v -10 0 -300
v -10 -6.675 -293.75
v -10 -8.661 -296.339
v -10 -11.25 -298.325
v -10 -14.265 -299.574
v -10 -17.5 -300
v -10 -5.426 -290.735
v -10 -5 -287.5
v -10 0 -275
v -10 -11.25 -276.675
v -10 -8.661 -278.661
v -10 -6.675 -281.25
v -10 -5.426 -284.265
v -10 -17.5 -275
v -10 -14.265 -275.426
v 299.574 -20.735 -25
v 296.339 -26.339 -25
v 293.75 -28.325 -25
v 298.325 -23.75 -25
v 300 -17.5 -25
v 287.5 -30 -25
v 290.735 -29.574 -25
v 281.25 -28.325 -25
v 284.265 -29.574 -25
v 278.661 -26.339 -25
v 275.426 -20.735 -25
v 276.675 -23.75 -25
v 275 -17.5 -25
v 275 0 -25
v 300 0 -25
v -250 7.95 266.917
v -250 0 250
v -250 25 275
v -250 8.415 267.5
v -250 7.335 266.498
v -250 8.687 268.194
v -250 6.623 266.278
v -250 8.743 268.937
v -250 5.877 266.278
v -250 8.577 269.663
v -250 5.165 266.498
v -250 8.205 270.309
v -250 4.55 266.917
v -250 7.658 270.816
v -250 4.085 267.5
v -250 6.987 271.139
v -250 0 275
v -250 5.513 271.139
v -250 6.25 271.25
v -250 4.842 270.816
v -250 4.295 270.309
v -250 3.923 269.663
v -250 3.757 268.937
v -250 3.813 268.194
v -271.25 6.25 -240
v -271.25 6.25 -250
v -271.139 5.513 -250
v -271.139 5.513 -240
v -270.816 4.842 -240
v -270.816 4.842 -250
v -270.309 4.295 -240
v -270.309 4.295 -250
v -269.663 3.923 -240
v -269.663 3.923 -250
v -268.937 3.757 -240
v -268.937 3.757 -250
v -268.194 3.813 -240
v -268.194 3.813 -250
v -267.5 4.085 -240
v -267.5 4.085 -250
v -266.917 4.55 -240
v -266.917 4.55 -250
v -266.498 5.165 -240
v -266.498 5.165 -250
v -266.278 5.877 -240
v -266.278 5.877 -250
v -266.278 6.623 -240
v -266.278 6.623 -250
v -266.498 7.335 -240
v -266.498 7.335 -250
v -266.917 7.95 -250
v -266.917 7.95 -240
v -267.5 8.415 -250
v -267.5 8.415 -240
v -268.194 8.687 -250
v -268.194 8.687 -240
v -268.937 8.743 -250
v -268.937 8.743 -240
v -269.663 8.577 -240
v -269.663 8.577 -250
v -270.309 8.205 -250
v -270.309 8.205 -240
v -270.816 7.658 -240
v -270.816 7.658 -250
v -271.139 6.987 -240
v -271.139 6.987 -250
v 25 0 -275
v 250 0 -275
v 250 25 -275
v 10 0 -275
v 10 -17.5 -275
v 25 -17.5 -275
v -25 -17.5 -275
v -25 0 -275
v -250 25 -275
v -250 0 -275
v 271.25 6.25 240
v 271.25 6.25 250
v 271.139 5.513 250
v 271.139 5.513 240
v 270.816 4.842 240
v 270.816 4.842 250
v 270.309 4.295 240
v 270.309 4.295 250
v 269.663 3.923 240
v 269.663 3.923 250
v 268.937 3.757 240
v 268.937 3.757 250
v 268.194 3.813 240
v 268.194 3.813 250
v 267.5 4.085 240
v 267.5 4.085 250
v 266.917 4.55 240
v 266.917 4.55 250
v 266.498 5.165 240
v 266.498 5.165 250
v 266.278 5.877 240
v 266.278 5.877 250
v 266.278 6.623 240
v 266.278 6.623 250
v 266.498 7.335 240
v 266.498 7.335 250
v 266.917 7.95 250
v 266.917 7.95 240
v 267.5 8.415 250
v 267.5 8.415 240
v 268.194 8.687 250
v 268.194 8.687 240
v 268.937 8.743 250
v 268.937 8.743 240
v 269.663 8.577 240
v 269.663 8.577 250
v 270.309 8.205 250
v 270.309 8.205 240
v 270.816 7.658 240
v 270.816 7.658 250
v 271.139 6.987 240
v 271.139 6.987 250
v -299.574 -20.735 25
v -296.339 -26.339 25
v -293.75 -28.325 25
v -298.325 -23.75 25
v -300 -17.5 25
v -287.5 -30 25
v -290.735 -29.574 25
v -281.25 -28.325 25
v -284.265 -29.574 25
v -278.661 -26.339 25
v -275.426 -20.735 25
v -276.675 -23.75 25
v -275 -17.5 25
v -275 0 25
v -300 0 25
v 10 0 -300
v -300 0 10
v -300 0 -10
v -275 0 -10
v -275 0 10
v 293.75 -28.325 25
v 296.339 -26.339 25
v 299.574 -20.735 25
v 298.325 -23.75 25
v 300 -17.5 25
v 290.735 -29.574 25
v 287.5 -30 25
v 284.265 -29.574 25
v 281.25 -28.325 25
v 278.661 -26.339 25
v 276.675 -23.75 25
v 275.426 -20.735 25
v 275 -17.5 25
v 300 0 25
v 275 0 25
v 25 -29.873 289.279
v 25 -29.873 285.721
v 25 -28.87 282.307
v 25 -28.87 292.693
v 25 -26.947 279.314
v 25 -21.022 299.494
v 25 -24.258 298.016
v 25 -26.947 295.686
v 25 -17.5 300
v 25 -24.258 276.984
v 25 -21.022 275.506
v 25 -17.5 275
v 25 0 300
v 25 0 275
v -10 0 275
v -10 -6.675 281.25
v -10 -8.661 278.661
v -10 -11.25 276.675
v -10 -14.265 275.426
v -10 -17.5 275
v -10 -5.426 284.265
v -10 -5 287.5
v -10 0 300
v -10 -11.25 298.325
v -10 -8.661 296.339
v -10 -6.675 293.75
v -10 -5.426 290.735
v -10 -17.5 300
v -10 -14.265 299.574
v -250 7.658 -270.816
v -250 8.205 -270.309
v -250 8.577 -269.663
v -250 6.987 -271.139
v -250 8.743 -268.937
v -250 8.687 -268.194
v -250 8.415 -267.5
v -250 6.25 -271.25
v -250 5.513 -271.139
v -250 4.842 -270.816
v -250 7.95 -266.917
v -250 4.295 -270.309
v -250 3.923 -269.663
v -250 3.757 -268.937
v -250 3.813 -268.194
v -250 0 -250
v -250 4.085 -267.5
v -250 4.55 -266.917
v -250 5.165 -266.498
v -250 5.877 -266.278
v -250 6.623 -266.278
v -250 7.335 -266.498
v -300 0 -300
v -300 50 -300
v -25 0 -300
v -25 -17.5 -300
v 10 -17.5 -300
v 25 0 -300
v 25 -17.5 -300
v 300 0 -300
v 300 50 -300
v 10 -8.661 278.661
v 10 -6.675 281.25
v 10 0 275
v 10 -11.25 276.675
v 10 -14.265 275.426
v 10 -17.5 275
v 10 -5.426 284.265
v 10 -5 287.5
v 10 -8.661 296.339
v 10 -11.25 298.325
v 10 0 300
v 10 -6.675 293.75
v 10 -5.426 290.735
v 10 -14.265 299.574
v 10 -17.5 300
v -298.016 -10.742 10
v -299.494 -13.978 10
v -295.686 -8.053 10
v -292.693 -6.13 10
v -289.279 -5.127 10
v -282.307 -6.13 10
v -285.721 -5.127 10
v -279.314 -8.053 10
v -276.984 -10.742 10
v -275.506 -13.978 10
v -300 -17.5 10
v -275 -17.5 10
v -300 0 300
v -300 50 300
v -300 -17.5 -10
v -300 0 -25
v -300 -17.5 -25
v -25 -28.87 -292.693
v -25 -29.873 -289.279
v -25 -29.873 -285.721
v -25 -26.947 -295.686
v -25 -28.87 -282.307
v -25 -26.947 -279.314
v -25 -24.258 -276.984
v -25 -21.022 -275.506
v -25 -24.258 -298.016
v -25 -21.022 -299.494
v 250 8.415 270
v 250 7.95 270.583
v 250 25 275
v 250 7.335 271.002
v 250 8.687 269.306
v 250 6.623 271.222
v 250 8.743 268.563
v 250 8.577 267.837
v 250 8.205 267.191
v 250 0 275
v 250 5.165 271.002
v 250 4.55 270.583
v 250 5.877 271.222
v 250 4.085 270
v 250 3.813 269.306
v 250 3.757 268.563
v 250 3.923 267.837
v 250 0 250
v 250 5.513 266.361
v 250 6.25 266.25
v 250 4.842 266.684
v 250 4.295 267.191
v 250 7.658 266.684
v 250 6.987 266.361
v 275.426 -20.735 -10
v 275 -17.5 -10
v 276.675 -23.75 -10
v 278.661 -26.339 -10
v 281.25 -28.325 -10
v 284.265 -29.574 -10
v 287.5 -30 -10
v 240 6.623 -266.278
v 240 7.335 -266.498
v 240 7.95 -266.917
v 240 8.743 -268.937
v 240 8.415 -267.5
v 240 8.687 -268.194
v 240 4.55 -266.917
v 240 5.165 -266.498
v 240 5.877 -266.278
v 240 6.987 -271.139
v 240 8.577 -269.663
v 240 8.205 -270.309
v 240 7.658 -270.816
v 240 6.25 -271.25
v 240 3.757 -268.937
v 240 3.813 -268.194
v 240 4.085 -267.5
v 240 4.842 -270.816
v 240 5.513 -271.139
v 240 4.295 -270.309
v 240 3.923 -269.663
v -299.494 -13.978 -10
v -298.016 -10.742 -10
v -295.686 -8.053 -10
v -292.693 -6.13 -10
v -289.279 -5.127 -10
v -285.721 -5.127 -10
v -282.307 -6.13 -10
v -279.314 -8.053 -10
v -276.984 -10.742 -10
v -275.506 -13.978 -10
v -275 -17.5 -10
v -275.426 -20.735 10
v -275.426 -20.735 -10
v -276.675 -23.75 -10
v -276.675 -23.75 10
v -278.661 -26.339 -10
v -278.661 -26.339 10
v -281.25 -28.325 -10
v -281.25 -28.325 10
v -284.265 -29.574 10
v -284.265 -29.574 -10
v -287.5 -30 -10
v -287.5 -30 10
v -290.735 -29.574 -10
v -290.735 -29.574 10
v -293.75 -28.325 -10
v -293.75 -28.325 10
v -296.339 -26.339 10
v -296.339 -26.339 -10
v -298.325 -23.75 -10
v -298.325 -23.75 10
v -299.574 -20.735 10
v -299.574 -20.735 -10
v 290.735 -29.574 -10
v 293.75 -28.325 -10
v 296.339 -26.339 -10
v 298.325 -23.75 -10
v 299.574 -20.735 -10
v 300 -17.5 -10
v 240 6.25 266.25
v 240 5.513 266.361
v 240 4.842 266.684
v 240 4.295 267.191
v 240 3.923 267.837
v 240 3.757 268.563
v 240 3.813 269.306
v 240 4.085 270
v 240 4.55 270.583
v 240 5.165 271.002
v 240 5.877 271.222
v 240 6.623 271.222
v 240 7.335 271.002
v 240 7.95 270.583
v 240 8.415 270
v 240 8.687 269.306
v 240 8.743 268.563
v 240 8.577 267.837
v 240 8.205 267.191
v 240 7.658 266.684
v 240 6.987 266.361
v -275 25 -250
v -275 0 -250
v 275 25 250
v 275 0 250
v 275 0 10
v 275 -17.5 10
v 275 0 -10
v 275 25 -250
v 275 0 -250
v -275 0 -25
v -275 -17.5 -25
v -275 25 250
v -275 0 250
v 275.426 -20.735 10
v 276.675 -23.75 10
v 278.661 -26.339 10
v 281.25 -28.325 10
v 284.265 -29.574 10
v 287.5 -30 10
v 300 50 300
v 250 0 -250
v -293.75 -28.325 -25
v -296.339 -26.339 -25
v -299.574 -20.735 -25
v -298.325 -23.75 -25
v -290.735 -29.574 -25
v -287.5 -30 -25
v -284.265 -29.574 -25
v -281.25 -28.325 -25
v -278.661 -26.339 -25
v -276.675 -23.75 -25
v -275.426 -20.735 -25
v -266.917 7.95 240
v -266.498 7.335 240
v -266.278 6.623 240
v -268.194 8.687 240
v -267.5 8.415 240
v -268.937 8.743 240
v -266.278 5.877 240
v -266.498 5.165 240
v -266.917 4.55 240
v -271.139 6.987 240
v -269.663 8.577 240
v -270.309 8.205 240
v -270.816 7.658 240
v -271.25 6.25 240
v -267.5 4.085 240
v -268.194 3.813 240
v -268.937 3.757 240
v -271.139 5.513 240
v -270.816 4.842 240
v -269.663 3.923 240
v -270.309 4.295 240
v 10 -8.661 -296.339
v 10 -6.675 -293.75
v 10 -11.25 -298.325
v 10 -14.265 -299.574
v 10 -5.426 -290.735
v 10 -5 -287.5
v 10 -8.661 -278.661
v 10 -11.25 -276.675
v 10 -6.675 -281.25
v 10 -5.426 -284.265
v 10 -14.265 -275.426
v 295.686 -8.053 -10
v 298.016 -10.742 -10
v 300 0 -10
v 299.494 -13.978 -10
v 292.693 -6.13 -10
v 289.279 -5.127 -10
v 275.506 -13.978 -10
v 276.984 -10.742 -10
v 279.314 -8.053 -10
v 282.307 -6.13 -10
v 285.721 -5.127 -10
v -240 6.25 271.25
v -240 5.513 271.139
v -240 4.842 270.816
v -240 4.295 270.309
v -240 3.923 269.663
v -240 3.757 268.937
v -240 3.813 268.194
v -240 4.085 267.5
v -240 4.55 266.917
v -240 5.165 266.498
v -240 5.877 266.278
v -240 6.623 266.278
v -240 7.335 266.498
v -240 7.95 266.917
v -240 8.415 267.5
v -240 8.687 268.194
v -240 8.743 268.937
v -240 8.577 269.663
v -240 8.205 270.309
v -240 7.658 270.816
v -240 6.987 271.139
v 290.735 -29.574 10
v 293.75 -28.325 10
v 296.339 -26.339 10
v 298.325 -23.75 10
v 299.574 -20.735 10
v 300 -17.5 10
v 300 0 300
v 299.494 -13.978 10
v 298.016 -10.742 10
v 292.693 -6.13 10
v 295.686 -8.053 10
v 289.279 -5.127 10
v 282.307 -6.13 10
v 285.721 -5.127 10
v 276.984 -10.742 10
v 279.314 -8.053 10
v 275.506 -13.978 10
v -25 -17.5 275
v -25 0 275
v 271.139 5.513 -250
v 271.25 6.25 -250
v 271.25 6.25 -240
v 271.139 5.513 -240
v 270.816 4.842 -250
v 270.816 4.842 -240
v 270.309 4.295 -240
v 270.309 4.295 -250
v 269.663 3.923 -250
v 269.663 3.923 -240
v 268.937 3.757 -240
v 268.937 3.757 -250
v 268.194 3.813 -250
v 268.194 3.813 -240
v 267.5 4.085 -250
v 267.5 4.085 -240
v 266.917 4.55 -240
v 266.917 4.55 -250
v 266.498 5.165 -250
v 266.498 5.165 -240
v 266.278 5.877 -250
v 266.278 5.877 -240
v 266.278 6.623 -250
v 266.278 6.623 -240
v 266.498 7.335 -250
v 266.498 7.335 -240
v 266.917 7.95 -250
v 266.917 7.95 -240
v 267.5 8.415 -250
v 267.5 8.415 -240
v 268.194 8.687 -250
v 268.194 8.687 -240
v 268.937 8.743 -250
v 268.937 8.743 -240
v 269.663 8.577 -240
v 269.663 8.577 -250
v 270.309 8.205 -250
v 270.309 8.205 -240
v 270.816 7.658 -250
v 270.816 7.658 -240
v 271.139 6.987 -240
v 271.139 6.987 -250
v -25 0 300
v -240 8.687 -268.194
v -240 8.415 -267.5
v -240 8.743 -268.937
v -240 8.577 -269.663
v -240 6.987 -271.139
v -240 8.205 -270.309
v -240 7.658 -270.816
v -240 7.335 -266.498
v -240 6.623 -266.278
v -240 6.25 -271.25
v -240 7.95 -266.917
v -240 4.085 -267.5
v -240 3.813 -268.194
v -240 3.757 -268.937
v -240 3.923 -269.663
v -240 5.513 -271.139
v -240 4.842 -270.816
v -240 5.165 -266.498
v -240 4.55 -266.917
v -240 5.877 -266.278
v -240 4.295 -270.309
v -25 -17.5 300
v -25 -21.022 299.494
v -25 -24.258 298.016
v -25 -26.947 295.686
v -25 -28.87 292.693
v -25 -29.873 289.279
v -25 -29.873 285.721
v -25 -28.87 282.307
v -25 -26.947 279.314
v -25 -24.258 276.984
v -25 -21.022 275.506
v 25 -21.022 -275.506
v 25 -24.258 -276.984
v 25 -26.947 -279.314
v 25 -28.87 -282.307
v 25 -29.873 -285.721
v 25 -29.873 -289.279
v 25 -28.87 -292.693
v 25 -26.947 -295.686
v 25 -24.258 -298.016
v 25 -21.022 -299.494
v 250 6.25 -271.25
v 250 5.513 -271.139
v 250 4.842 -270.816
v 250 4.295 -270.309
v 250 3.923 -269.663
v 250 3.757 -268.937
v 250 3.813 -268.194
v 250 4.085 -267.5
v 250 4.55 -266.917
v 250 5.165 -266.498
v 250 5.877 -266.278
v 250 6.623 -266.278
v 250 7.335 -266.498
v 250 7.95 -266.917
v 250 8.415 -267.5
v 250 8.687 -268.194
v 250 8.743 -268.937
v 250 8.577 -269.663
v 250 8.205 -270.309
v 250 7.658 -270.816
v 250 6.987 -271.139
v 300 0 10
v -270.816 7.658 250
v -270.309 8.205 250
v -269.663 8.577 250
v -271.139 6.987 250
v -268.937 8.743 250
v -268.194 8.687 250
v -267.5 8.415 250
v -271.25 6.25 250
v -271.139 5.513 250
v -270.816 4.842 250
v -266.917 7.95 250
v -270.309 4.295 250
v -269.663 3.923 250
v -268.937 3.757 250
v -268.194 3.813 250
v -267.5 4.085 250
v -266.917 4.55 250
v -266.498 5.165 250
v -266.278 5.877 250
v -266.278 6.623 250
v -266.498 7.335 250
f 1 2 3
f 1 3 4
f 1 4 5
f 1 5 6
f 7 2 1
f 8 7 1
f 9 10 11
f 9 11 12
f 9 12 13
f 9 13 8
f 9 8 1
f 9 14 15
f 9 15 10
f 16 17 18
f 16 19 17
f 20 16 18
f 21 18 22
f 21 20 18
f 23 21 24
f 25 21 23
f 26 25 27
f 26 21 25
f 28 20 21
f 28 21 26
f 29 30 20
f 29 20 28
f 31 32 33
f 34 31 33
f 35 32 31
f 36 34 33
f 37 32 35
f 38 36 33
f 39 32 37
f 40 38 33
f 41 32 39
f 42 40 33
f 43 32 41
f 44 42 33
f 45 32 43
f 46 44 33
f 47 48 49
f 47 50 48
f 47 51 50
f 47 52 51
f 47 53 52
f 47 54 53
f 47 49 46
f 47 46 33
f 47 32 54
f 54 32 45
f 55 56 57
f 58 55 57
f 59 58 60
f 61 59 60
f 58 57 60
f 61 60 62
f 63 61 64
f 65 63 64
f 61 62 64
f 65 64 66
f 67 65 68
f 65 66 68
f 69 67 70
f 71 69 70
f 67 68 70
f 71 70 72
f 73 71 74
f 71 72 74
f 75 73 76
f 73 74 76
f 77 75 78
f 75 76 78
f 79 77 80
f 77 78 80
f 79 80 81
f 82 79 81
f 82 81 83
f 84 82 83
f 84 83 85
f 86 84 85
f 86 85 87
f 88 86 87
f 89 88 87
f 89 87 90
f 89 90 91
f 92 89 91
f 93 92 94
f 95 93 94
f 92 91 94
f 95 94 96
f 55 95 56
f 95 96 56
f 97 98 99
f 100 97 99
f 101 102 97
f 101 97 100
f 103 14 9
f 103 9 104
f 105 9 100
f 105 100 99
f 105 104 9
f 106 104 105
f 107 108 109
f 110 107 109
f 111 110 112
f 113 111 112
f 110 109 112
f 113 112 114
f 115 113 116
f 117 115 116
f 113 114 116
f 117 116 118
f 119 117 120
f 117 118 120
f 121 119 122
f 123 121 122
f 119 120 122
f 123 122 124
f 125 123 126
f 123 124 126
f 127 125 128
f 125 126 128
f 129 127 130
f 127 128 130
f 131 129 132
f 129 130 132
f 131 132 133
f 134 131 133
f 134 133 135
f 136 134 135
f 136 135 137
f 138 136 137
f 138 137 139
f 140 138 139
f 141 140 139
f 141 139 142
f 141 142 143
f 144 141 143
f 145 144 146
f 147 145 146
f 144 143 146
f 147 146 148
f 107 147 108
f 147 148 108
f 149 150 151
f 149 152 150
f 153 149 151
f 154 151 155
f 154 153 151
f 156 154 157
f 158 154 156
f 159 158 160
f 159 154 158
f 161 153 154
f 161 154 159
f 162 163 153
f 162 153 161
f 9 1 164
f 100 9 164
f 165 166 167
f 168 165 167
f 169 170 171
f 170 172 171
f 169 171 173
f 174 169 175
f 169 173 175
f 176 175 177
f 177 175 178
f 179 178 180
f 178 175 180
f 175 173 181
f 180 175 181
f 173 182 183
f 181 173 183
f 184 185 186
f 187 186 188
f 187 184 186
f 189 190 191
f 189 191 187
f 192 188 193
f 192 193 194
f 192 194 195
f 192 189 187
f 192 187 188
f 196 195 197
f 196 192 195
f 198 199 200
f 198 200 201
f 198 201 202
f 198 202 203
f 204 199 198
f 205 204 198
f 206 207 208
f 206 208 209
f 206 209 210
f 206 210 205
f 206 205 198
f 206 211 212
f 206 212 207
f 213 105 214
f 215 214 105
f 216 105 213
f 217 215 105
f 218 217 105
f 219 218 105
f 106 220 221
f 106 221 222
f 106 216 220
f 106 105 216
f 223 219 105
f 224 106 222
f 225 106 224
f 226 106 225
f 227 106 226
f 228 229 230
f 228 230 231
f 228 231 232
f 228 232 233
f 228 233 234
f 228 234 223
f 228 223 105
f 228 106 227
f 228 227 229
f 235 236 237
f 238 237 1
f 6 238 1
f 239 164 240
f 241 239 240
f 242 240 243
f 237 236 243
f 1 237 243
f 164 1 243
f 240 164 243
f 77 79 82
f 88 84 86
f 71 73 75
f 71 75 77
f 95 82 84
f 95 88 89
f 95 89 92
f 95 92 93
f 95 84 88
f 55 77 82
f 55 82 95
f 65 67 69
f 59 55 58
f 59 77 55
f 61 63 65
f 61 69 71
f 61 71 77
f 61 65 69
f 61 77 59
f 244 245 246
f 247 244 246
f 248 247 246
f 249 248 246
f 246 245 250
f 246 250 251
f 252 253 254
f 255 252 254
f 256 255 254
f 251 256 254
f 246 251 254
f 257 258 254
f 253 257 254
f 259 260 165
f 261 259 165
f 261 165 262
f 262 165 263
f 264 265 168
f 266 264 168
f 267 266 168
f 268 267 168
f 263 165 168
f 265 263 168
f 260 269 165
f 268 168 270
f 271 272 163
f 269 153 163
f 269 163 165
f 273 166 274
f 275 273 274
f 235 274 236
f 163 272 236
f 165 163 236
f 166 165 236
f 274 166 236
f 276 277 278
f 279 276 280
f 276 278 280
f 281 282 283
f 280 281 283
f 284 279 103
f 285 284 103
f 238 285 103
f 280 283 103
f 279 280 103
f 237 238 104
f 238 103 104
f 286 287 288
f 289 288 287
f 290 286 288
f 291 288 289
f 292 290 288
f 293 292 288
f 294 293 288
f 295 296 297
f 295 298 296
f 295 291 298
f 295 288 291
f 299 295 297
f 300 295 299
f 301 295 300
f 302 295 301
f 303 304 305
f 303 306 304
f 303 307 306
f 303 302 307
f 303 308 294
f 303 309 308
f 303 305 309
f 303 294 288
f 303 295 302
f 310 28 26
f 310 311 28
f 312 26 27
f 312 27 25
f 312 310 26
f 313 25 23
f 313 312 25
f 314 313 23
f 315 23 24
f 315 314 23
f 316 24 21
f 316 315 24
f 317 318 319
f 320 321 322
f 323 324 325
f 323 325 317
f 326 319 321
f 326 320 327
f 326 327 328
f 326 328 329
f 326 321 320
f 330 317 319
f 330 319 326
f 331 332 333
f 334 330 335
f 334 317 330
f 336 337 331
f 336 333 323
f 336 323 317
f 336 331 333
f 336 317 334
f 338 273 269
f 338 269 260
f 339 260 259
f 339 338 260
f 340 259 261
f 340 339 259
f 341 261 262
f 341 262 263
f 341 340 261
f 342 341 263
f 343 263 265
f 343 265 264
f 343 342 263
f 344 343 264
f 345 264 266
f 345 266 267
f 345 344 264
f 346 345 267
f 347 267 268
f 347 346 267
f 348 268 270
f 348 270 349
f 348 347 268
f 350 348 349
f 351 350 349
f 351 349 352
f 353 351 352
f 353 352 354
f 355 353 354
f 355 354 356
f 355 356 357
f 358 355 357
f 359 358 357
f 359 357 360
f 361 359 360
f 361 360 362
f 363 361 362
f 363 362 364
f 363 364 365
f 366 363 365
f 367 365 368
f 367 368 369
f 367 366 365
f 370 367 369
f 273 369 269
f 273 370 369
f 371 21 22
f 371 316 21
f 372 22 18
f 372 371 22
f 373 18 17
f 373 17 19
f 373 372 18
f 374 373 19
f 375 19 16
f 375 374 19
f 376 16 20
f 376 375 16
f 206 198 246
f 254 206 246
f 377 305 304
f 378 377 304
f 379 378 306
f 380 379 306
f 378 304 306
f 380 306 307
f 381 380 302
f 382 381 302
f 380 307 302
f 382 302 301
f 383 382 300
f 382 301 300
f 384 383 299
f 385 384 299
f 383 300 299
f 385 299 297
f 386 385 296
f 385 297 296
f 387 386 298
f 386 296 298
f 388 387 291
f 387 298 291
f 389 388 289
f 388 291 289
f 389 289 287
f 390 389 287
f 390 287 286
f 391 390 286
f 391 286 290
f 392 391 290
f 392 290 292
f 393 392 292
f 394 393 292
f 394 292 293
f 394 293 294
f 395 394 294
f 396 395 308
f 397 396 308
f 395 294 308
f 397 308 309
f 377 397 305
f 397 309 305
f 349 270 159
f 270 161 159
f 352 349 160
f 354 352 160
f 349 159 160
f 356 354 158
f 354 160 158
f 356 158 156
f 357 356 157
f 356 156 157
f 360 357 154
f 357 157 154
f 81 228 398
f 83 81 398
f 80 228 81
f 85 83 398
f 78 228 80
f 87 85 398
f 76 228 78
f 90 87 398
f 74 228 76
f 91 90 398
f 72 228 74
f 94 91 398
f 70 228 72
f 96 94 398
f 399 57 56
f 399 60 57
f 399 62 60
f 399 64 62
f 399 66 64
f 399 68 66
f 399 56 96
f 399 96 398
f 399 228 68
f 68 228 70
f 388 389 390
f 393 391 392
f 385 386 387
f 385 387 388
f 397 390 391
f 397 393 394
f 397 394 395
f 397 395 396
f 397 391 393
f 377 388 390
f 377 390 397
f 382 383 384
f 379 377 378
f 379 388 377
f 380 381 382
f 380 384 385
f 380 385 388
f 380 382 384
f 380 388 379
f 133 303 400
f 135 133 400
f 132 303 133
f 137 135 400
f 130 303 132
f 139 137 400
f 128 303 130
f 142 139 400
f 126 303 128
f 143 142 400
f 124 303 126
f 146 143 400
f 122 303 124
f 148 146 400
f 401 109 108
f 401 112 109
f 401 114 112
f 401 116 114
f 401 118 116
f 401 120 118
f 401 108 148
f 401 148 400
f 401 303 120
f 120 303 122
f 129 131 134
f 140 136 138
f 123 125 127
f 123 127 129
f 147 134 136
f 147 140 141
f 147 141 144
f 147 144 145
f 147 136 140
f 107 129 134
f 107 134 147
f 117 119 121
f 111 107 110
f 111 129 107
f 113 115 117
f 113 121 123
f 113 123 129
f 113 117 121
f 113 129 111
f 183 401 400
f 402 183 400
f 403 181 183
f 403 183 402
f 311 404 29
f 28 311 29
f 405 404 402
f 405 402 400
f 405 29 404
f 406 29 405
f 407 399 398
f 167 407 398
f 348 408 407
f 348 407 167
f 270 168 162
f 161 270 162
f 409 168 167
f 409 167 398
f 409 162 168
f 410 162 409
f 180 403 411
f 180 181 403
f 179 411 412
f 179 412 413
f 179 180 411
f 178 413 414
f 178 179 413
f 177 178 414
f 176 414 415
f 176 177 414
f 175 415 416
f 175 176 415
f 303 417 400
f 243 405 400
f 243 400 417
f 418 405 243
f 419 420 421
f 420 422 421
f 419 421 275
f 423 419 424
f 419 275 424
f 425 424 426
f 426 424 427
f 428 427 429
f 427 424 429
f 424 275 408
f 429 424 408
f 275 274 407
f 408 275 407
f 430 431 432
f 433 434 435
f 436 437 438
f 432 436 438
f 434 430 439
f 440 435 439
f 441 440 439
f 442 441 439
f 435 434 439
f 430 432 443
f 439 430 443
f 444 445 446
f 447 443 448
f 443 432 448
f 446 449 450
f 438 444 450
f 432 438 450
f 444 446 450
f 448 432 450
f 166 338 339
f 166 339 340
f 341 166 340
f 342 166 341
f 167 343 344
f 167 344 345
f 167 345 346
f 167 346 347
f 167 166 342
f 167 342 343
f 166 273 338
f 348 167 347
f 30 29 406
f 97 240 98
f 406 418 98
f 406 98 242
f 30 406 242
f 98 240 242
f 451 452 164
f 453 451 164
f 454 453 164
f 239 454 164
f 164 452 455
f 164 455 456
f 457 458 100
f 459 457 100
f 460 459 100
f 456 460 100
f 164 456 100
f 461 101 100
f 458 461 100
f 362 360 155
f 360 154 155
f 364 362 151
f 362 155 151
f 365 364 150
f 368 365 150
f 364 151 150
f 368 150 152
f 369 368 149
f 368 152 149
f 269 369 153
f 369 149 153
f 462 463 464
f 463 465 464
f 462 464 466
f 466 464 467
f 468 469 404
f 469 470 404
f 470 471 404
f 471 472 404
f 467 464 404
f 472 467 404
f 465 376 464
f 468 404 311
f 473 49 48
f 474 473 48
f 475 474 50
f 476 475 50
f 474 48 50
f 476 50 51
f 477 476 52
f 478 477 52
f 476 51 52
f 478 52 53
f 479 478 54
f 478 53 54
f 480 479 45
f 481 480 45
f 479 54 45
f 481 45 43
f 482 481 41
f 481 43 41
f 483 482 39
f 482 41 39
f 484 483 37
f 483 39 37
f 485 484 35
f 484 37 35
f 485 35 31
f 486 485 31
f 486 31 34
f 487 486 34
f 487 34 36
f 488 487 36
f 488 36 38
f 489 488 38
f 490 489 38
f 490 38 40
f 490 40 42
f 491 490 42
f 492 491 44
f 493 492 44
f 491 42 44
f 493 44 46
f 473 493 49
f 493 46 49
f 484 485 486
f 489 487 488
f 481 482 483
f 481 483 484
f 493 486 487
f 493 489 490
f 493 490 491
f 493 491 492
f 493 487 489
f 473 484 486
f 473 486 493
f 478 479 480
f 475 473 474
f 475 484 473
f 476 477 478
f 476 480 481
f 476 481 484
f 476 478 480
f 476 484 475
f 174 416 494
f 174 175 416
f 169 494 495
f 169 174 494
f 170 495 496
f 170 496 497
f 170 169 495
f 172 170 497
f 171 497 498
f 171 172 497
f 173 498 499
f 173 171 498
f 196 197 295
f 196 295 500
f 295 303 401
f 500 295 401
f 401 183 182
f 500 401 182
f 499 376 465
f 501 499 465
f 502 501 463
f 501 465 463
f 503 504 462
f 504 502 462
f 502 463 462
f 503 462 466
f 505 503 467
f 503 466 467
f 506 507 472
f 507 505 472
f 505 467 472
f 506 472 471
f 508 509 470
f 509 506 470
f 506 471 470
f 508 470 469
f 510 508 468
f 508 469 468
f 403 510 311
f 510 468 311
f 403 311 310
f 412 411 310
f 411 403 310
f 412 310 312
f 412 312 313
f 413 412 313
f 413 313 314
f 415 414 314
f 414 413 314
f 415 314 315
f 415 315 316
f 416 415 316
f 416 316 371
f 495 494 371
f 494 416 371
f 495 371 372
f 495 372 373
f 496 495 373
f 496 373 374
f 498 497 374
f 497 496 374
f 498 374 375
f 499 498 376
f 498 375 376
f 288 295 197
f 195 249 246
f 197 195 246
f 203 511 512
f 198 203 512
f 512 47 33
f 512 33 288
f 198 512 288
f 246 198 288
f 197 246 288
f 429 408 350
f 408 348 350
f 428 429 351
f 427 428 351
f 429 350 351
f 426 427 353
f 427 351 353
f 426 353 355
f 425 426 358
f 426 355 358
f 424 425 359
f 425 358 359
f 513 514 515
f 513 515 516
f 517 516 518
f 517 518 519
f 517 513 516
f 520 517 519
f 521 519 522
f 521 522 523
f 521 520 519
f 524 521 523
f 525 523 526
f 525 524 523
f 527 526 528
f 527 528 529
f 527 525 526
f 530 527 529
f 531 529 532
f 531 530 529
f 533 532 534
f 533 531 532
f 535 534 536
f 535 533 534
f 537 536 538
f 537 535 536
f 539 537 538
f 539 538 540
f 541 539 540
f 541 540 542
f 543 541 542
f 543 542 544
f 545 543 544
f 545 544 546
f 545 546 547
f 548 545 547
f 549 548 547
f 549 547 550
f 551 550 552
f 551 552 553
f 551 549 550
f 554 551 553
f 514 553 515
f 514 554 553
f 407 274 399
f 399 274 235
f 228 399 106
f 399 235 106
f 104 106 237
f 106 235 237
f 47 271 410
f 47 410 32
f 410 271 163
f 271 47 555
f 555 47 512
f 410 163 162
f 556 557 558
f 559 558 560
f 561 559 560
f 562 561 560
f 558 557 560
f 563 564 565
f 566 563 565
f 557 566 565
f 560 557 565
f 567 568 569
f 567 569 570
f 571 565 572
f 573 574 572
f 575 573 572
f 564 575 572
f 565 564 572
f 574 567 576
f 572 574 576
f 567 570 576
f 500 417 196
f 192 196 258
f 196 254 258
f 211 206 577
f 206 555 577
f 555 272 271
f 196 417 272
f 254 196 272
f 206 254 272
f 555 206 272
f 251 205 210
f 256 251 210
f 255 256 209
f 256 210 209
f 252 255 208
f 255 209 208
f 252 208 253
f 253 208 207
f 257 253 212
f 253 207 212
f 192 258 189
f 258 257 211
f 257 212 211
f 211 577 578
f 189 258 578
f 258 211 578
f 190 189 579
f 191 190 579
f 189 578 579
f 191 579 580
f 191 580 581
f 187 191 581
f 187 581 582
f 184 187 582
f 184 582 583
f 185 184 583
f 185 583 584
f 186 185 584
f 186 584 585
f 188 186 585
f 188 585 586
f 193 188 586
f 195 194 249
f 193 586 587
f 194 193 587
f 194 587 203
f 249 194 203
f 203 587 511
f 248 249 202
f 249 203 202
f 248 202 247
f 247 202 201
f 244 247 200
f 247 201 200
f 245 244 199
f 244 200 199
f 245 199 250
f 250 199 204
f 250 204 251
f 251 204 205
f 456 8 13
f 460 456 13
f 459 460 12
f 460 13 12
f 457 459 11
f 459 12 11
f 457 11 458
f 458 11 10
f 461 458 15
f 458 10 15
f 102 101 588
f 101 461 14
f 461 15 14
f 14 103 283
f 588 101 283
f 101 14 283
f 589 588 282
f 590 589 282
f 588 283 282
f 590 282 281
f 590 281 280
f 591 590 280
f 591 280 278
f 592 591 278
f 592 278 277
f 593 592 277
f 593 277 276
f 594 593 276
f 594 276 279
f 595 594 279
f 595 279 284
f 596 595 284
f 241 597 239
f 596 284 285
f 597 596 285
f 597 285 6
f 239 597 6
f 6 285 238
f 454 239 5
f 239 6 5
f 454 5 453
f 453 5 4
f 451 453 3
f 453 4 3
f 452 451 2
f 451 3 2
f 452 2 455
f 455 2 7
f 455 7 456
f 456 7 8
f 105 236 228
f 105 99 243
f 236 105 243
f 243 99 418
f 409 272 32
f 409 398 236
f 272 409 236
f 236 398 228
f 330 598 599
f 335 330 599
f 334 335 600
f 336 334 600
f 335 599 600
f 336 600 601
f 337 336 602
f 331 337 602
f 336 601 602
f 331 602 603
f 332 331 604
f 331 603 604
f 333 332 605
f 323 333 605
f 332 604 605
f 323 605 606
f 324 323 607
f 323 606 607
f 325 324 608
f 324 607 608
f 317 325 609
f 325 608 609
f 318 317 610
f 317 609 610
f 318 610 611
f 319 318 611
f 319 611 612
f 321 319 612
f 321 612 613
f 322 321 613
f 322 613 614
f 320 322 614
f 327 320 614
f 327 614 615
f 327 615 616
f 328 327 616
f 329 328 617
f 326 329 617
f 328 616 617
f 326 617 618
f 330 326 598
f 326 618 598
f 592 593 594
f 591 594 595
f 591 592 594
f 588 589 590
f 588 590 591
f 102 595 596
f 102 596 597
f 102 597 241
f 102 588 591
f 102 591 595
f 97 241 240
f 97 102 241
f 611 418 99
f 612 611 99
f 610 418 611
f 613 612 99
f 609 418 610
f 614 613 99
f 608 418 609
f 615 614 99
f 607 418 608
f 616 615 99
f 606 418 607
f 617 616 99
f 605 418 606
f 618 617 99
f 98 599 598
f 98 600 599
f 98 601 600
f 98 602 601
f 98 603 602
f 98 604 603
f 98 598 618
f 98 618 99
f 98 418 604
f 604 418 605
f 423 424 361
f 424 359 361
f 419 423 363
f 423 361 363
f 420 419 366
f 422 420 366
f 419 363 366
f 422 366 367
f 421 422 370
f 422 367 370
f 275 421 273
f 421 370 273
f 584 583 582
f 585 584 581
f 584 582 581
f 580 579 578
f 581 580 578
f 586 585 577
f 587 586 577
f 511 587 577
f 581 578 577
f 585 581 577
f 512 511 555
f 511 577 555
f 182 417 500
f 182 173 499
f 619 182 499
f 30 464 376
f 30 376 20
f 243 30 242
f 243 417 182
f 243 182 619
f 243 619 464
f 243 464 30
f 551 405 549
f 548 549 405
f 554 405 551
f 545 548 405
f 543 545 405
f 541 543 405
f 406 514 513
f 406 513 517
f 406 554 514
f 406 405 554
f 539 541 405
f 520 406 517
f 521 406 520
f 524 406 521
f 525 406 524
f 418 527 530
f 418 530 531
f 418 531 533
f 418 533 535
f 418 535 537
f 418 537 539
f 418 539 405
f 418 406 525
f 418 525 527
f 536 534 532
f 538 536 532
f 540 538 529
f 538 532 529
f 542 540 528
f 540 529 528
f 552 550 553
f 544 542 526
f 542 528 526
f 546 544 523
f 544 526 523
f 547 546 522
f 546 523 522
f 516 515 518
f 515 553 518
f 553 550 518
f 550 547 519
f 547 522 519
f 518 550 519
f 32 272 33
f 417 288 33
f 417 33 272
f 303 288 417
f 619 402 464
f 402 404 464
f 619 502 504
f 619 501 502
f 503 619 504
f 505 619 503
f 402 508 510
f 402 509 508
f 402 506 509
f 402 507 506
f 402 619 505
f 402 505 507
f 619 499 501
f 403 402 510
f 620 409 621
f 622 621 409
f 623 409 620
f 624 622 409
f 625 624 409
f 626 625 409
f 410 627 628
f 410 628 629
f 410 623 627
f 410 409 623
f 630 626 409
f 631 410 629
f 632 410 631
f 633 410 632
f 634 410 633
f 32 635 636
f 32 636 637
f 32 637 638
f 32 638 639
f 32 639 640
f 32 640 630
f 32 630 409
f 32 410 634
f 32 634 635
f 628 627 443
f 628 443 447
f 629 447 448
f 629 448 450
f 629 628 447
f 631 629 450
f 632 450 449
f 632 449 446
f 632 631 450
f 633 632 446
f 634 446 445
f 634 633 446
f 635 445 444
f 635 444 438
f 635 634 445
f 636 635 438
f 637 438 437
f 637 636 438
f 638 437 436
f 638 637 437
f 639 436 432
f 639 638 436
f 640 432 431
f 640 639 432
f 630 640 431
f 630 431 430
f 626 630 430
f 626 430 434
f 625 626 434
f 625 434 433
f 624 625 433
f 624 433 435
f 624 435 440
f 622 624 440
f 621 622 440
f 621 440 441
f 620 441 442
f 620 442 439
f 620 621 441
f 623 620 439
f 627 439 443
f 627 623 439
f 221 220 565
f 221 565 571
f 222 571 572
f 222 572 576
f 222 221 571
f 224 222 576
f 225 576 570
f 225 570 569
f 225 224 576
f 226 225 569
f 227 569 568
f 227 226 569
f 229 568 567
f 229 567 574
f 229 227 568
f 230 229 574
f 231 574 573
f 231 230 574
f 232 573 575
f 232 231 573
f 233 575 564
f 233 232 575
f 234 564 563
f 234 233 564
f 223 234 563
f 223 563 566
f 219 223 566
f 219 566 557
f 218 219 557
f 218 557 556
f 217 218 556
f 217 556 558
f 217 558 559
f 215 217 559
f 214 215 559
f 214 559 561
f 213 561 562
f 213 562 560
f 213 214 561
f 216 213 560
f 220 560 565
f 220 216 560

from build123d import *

# Parameters (mm, degrees)
SKETCH1_W                                  = 700
SKETCH1_H                                  = 700
SKETCH1_W_2                                = 500
SKETCH1_H_2                                = 500
BOSS_EXTRUDE2_DEPTH                        = 50
BOSS_EXTRUDE2_DRAFT                        = 45
SKETCH6_W                                  = 700
SKETCH6_H                                  = 700
SKETCH6_W_2                                = 600
SKETCH6_H_2                                = 600
CUT_EXTRUDE1_DEPTH                         = 50
CUT_EXTRUDE2_DEPTH                         = 25
SKETCH8_R                                  = 2.5
BOSS_EXTRUDE3_DEPTH                        = 10
MIRROR1_AT_THE_SECOND_PLANE_COPY_1_SKETC_R = 2.5
MIRROR1_AT_THE_SECOND_PLANE_COPY_1_DEPTH   = 10
MIRROR2_COPY_1_SKETCH_R                    = 2.5
MIRROR2_COPY_1_DEPTH                       = 10
MIRROR2_COPY_2_SKETCH_R                    = 2.5
MIRROR2_COPY_2_DEPTH                       = 10
MIRROR2_COPY_3_SKETCH_R                    = 2.5
MIRROR2_COPY_3_DEPTH                       = 10
SKETCH9_W                                  = 25
SKETCH9_H                                  = 15
BOSS_EXTRUDE4_DEPTH                        = 30
SKETCH11_R                                 = 12.5
BOSS_EXTRUDE5_DEPTH                        = 50
FILLET1_R                                  = 12.5
FILLET1_OF_MIRROR3_R                       = 12.5
MIRROR4_START                              = -25
MIRROR4_OUTLINE_R                          = 12.5
MIRROR4_DEPTH                              = 50
MIRROR4_2_DEPTH                            = 15
MIRROR4_START_2                            = 10
MIRROR4_3_DEPTH                            = 15


# Read off the part's stored shape, not the designer's step: Mirror4
with BuildPart() as part:
    # Sketch1 → Boss-Extrude2 (with draft: the straight prism first)
    with BuildSketch(Plane(origin=(0, 0, 0), x_dir=(1, 0, 0), z_dir=(0, 1, 0))):
        Rectangle(SKETCH1_W, SKETCH1_H)
        Rectangle(SKETCH1_W_2, SKETCH1_H_2, mode=Mode.SUBTRACT)
    extrude(amount=BOSS_EXTRUDE2_DEPTH)
    # Boss-Extrude2: the draft: its side faces are tilted about the plane it starts from
    boss_extrude2_sides = [part.faces().sort_by_distance(p)[0] for p in [
        (-350, 25, 0),
        (0, 25, 350),
        (350, 25, 0),
        (0, 25, -350),
        (250, 25, 0),
        (0, 25, 250),
        (-250, 25, 0),
        (0, 25, -250),
    ]]
    draft(boss_extrude2_sides, Plane(origin=(0, 0, 0), x_dir=(1, 0, 0), z_dir=(0, 1, 0)), BOSS_EXTRUDE2_DRAFT)

    # Sketch6 → Cut-Extrude1 (cut)
    with BuildSketch(Plane(origin=(0, 50, 0), x_dir=(1, 0, 0), z_dir=(0, 1, 0))):
        Rectangle(SKETCH6_W, SKETCH6_H)
        Rectangle(SKETCH6_W_2, SKETCH6_H_2, mode=Mode.SUBTRACT)
    extrude(amount=-CUT_EXTRUDE1_DEPTH, mode=Mode.SUBTRACT)

    # Sketch7 → Cut-Extrude2 (cut)
    with BuildSketch(Plane.XZ):
        Polygon((-275, 250), (-250, 250), (-250, 275), (250, 275), (250, 250), (275, 250), (275, -250), (250, -250), (250, -275), (-250, -275), (-250, -250), (-275, -250), align=None)
    extrude(amount=-CUT_EXTRUDE2_DEPTH, mode=Mode.SUBTRACT)

    # Sketch8 → Boss-Extrude3 (add)
    with BuildSketch(Plane.XY.offset(-250)):
        with Locations(Location((-268.75, 6.25, 0), (0, 0, 180))):
            Circle(SKETCH8_R)
    boss_extrude3 = extrude(amount=BOSS_EXTRUDE3_DEPTH)

    # Mirror1: Boss-Extrude3 across plane
    add(boss_extrude3.mirror(Plane(origin=(0, 0, 0), x_dir=(0, 0, 1), z_dir=(1, 0, 0))))

    # Mirror1 at the second plane: Boss-Extrude3 across plane
    add(boss_extrude3.mirror(Plane.XY))

    # Mirror1 at the second plane copy 1 sketc → Mirror1 at the second plane copy 1 (add)
    with BuildSketch(Plane(origin=(0, 0, 250), x_dir=(-1, 0, 0), z_dir=(0, 0, -1))):
        with Locations(Location((-268.75, 6.25, 0), (0, 0, 180))):
            Circle(MIRROR1_AT_THE_SECOND_PLANE_COPY_1_SKETC_R)
    extrude(amount=MIRROR1_AT_THE_SECOND_PLANE_COPY_1_DEPTH)

    # Mirror2: Boss-Extrude3 across plane
    add(boss_extrude3.mirror(Plane(origin=(0, 0, 0), x_dir=(0.7071067811865477, 0, 0.7071067811865474), z_dir=(-0.7071067811865474, 0, 0.7071067811865477))))

    # Mirror2 copy 1 sketch → Mirror2 copy 1 (add)
    with BuildSketch(Plane(origin=(-250, 0, 0), x_dir=(0, 0, -1), z_dir=(1, 0, 0))):
        with Locations(Location((-268.75, 6.25, 0), (0, 0, 180))):
            Circle(MIRROR2_COPY_1_SKETCH_R)
    extrude(amount=MIRROR2_COPY_1_DEPTH)

    # Mirror2 copy 2 sketch → Mirror2 copy 2 (add)
    with BuildSketch(Plane.ZY.offset(-250)):
        with Locations(Location((-268.75, 6.25, 0), (0, 0, 180))):
            Circle(MIRROR2_COPY_2_SKETCH_R)
    extrude(amount=MIRROR2_COPY_2_DEPTH)

    # Mirror2 copy 3 sketch → Mirror2 copy 3 (add)
    with BuildSketch(Plane(origin=(250, 0, 0), x_dir=(0, 0, -1), z_dir=(-1, 0, 0))):
        with Locations((-268.75, -6.25)):
            Circle(MIRROR2_COPY_3_SKETCH_R)
    extrude(amount=MIRROR2_COPY_3_DEPTH)

    # Sketch9 → Boss-Extrude4 (add)
    with BuildSketch(Plane.XZ):
        with Locations((-287.5, 17.5)):
            Rectangle(SKETCH9_W, SKETCH9_H)
        with Locations((-287.5, -17.5)):
            Rectangle(SKETCH9_W, SKETCH9_H)
    boss_extrude4 = extrude(amount=BOSS_EXTRUDE4_DEPTH)

    # Sketch11 → Boss-Extrude5 (add)
    with BuildSketch(Plane(origin=(0, 0, -25), x_dir=(-1, 0, 0), z_dir=(0, 0, -1))):
        with Locations((287.5, -17.5)):
            Circle(SKETCH11_R)
    boss_extrude5 = extrude(amount=-BOSS_EXTRUDE5_DEPTH)

    # Fillet1
    fillet1_edges = [part.edges().sort_by_distance(p)[0] for p in [
        (-275, -30, -17.5),
        (-275, -30, 17.5),
        (-300, -30, 17.5),
        (-300, -30, -17.5),
    ]]
    fillet(fillet1_edges, radius=FILLET1_R - 0.0001)  # a hair under: the kernel refuses the full size

    # Mirror3: Boss-Extrude4, Boss-Extrude5 across plane
    add(boss_extrude4.mirror(Plane(origin=(0, 0, 0), x_dir=(0, 0, 1), z_dir=(1, 0, 0))))
    add(boss_extrude5.mirror(Plane(origin=(0, 0, 0), x_dir=(0, 0, 1), z_dir=(1, 0, 0))))

    # Fillet1 of Mirror3
    fillet1_of_mirror3_edges = [part.edges().sort_by_distance(p)[0] for p in [
        (275, -30, -17.5),
        (275, -30, 17.5),
        (300, -30, 17.5),
        (300, -30, -17.5),
    ]]
    fillet(fillet1_of_mirror3_edges, radius=FILLET1_OF_MIRROR3_R - 0.0001)  # a hair under: the kernel refuses the full size



with BuildPart() as body_2:
    # Mirror4 outline → Mirror4 (new body)
    with BuildSketch(Plane.YZ.offset(MIRROR4_START)):
        with Locations((-17.5, 287.5)):
            Circle(MIRROR4_OUTLINE_R)
        with Locations((-17.5, -287.5)):
            Circle(MIRROR4_OUTLINE_R)
    extrude(amount=MIRROR4_DEPTH)


with BuildPart() as part_1:
    add(part.part)

    add(body_2.part)  # Mirror4 2 merges body 2
    # Mirror4 2 outline → Mirror4 2 (add)
    with BuildSketch(Plane.YZ.offset(MIRROR4_START)):
        with BuildLine():
            ThreePointArc((-17.5, 300), (-5, 287.5), (-17.5, 275))
            Line((-17.5, 275), (0, 275))
            Line((0, 275), (0, 300))
            Line((0, 300), (-17.5, 300))
        make_face()
        with BuildLine():
            ThreePointArc((-17.5, -275), (-5, -287.5), (-17.5, -300))
            Line((-17.5, -300), (0, -300))
            Line((0, -300), (0, -275))
            Line((0, -275), (-17.5, -275))
        make_face()
    extrude(amount=MIRROR4_2_DEPTH)

    # Mirror4 3 outline → Mirror4 3 (add)
    with BuildSketch(Plane.YZ.offset(MIRROR4_START_2)):
        with BuildLine():
            ThreePointArc((-17.5, 300), (-5, 287.5), (-17.5, 275))
            Line((-17.5, 275), (0, 275))
            Line((0, 275), (0, 300))
            Line((0, 300), (-17.5, 300))
        make_face()
        with BuildLine():
            ThreePointArc((-17.5, -275), (-5, -287.5), (-17.5, -300))
            Line((-17.5, -300), (0, -300))
            Line((0, -300), (0, -275))
            Line((0, -275), (-17.5, -275))
        make_face()
    extrude(amount=MIRROR4_3_DEPTH)


solid = part_1.part
